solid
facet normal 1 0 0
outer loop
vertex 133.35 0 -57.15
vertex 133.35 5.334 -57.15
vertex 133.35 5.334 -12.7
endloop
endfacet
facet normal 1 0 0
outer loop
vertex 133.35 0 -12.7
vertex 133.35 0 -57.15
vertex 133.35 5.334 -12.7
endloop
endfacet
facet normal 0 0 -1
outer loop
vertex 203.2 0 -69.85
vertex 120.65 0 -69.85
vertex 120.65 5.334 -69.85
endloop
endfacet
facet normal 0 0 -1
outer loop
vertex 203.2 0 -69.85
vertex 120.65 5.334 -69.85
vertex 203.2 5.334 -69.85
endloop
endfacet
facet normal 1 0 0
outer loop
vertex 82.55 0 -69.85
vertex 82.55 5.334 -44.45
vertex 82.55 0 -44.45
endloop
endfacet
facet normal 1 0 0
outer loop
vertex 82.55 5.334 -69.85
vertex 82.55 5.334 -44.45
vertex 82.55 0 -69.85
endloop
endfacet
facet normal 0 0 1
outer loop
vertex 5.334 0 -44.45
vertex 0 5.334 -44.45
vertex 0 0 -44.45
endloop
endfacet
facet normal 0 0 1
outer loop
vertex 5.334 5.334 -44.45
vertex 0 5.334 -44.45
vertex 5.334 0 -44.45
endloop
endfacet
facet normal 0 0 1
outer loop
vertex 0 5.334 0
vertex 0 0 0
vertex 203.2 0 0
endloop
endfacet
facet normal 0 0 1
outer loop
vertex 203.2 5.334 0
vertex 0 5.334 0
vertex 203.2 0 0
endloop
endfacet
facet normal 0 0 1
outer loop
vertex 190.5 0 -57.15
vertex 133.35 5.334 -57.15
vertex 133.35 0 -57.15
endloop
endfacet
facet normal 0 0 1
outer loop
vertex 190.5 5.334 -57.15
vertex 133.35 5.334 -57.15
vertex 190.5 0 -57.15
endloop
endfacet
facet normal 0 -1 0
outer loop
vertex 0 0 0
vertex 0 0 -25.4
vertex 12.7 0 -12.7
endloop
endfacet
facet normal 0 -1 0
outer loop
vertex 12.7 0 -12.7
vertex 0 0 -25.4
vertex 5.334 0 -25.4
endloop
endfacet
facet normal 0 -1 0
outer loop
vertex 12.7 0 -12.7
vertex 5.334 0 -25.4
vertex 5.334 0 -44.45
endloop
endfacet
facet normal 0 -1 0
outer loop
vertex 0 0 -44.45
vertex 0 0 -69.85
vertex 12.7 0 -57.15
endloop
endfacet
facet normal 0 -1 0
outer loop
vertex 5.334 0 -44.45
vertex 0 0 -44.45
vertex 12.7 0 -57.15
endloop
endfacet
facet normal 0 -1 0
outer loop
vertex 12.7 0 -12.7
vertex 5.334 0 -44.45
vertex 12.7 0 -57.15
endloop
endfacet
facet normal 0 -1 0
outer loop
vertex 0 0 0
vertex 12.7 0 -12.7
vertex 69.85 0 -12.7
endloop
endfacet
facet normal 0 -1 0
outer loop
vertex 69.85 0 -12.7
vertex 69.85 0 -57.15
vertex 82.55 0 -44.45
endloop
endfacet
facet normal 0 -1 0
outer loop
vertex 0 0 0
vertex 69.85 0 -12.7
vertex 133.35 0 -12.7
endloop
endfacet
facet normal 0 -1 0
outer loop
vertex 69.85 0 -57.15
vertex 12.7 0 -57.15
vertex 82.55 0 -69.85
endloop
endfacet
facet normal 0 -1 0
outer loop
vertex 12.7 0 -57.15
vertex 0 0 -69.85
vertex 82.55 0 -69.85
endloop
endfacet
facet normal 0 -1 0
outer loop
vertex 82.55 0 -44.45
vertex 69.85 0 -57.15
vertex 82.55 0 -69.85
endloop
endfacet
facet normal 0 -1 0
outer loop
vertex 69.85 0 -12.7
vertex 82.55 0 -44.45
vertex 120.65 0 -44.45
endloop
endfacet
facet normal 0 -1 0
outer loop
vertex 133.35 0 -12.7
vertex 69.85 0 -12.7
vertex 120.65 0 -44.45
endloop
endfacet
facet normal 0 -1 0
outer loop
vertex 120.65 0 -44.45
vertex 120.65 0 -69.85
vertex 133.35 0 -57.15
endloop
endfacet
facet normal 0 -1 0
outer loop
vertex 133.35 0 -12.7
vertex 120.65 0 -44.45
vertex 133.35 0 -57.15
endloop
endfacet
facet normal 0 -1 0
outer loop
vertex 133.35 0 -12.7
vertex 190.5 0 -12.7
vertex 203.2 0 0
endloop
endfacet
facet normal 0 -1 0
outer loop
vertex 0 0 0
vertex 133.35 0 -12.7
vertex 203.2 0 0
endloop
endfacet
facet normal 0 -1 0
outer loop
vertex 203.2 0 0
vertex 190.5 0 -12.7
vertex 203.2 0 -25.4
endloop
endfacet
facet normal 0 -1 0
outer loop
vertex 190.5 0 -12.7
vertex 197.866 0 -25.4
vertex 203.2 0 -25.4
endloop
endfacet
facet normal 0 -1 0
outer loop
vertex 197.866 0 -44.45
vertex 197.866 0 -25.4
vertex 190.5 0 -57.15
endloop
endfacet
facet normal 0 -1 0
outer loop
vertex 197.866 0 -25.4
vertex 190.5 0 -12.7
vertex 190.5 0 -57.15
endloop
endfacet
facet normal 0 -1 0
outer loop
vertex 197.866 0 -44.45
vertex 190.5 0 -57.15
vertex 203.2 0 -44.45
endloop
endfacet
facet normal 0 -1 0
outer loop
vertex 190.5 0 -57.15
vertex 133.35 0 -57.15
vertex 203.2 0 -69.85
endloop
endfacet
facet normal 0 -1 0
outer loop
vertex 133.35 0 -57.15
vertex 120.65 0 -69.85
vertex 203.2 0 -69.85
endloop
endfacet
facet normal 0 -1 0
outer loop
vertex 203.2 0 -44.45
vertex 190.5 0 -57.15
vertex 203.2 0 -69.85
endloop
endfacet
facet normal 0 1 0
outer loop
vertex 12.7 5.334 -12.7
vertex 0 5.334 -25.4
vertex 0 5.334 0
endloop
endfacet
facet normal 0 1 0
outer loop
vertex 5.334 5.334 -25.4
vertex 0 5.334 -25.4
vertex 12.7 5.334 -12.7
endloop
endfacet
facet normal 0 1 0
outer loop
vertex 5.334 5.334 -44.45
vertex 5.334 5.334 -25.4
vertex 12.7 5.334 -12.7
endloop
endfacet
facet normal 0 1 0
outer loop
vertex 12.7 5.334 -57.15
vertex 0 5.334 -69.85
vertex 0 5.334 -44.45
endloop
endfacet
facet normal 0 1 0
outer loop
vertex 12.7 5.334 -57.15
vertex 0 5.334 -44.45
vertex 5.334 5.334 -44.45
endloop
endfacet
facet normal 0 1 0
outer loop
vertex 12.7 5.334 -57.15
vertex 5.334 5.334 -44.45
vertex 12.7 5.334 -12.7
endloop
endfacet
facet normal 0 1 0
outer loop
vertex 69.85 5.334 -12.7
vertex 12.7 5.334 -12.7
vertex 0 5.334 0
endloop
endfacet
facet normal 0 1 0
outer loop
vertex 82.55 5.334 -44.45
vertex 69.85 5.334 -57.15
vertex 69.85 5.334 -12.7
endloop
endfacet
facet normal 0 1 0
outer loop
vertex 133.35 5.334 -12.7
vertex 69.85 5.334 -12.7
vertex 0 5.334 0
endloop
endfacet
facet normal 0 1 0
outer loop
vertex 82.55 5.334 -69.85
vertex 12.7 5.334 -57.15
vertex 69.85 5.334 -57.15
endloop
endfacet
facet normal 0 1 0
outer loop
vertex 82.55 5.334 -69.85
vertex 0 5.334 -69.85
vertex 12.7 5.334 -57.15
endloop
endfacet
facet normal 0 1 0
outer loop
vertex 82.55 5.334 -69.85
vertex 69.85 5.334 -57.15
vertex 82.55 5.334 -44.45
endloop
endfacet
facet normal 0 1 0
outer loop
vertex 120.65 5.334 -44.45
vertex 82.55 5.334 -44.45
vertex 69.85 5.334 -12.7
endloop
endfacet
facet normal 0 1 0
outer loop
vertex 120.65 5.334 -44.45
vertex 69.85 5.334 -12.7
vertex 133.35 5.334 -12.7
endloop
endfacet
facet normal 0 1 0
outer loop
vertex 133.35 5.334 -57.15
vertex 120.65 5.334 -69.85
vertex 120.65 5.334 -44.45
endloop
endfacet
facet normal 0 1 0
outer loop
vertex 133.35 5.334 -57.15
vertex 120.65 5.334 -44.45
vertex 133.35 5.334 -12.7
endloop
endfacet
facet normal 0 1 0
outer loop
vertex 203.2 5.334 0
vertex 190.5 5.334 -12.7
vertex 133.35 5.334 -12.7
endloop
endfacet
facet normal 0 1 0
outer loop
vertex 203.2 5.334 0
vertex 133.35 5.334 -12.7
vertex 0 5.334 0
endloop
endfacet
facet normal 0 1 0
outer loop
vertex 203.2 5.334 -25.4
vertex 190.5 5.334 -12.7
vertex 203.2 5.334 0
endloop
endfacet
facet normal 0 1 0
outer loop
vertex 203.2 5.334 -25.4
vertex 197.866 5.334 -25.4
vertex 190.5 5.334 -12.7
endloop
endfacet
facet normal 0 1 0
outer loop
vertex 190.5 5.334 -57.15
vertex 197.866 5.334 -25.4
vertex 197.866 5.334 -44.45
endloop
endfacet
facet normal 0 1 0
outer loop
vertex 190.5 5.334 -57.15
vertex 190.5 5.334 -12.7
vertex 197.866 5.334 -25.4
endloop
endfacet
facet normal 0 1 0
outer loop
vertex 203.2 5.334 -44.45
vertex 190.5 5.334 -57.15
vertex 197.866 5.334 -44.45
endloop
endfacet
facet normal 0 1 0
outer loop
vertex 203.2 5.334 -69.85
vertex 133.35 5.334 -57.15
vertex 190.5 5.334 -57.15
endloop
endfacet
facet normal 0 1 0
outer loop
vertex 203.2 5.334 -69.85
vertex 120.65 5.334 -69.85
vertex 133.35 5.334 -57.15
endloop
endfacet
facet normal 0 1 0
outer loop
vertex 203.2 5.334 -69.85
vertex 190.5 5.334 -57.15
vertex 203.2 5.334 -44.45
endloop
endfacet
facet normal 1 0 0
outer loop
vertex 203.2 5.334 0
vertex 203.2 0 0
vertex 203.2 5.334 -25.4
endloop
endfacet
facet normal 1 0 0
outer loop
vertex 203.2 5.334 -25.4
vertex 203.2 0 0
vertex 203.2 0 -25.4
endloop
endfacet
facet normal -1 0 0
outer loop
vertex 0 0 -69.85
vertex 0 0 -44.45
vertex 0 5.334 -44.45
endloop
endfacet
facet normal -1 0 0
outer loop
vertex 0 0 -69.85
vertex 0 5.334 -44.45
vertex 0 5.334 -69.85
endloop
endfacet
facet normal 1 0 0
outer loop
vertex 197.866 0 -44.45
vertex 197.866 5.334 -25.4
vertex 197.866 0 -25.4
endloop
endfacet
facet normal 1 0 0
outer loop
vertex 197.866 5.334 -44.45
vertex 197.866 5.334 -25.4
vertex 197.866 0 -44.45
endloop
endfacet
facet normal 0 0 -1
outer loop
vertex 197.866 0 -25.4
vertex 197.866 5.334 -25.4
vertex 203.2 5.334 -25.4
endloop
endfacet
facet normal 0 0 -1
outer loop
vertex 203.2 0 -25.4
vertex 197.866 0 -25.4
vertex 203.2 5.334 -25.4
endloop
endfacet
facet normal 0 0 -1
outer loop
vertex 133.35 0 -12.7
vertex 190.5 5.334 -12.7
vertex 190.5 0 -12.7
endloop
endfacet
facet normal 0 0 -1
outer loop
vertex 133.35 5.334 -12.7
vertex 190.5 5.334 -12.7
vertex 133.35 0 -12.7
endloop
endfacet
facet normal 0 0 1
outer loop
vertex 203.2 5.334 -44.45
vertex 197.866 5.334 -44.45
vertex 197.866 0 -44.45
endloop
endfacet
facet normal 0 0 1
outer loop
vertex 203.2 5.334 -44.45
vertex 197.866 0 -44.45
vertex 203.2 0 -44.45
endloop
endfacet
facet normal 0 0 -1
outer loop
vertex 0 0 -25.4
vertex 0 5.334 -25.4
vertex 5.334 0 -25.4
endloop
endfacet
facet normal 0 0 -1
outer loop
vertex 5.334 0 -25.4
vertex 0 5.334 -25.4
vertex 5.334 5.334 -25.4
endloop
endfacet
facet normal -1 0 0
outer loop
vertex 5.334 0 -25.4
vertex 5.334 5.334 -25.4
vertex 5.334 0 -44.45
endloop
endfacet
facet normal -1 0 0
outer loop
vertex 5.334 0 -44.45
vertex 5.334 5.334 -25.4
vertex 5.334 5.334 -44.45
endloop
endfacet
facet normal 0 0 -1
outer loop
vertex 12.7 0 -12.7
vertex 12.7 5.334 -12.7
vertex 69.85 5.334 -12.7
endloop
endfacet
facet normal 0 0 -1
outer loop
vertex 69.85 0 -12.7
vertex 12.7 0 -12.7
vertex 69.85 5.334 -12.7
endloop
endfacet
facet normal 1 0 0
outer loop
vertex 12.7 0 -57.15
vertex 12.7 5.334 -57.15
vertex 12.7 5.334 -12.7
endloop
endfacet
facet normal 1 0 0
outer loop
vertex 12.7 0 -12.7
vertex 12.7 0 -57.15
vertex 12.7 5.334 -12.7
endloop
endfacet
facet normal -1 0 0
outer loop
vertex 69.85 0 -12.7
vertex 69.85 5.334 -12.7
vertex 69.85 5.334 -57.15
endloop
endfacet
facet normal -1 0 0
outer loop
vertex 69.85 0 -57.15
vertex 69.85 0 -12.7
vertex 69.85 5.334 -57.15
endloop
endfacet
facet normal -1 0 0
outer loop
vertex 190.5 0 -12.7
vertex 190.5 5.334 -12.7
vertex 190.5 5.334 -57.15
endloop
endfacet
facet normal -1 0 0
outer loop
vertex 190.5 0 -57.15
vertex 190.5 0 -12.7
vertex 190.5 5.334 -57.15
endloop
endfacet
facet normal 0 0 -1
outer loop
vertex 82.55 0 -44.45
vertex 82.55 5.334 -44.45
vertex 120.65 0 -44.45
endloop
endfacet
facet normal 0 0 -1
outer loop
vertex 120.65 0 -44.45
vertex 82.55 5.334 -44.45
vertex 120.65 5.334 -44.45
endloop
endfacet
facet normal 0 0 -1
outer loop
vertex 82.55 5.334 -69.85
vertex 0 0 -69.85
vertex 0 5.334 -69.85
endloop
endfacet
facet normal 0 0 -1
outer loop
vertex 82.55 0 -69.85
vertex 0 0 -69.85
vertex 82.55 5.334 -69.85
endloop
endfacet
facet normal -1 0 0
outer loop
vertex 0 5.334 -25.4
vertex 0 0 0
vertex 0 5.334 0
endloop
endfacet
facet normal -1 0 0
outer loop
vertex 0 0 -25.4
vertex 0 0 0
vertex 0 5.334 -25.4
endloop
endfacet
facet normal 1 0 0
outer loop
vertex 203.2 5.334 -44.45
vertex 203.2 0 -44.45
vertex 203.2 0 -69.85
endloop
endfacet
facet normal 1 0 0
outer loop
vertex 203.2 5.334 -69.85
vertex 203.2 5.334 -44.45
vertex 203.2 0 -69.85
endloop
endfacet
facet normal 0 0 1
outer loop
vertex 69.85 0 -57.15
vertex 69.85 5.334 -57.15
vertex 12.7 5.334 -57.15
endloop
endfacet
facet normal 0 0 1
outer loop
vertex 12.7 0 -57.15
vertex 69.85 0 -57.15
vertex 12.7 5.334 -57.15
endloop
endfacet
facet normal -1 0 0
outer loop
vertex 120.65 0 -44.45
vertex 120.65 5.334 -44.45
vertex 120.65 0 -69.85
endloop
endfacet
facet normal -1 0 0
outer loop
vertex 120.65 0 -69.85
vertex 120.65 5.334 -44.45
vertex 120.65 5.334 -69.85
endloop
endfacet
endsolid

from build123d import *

# Parameters (mm, degrees)
SKETCH1_W              = 203.2
SKETCH1_H              = 69.85
BASE_DEPTH             = 5.334
SKETCH2_W              = 5.334
SKETCH2_H              = 19.05
SLOTS_DEPTH            = 215.936534949
SKETCH3_W              = 38.1
SKETCH3_H              = 25.4
CENTER_CUTOUT_DEPTH    = 215.936534949
WEIGHT_REDUCTION_DEPTH = 215.936534949


with BuildPart() as part:
    # Sketch1 → Base (new body)
    with BuildSketch(Plane(origin=(0, 0, 0), x_dir=(1, 0, 0), z_dir=(0, 1, 0))):
        with Locations((101.6, 34.925)):
            Rectangle(SKETCH1_W, SKETCH1_H)
    extrude(amount=BASE_DEPTH)

    # Sketch2 → Slots (cut, through all)
    with BuildSketch(Plane(origin=(0, 5.334, 0), x_dir=(1, 0, 0), z_dir=(0, 1, 0))):
        with Locations((2.667, 34.925)):
            Rectangle(SKETCH2_W, SKETCH2_H)
        with Locations((200.533, 34.925)):
            Rectangle(SKETCH2_W, SKETCH2_H)
    extrude(amount=-SLOTS_DEPTH, mode=Mode.SUBTRACT)

    # Sketch3 → Center Cutout (cut, through all)
    with BuildSketch(Plane(origin=(0, 5.334, 0), x_dir=(1, 0, 0), z_dir=(0, 1, 0))):
        with Locations((101.6, 57.15)):
            Rectangle(SKETCH3_W, SKETCH3_H)
    extrude(amount=-CENTER_CUTOUT_DEPTH, mode=Mode.SUBTRACT)

    # Sketch4 → Weight Reduction (cut, through all)
    with BuildSketch(Plane(origin=(0, 5.334, 0), x_dir=(1, 0, 0), z_dir=(0, 1, 0))):
        Polygon((69.85, 44.45), (69.85, 57.15), (12.7, 57.15), (12.7, 44.45), (12.7, 25.4), (12.7, 12.7), (69.85, 12.7), align=None)
        Polygon((190.5, 25.4), (190.5, 12.7), (133.35, 12.7), (133.35, 44.45), (133.35, 57.15), (190.5, 57.15), (190.5, 44.45), align=None)
    extrude(amount=-WEIGHT_REDUCTION_DEPTH, mode=Mode.SUBTRACT)


solid = part.part
